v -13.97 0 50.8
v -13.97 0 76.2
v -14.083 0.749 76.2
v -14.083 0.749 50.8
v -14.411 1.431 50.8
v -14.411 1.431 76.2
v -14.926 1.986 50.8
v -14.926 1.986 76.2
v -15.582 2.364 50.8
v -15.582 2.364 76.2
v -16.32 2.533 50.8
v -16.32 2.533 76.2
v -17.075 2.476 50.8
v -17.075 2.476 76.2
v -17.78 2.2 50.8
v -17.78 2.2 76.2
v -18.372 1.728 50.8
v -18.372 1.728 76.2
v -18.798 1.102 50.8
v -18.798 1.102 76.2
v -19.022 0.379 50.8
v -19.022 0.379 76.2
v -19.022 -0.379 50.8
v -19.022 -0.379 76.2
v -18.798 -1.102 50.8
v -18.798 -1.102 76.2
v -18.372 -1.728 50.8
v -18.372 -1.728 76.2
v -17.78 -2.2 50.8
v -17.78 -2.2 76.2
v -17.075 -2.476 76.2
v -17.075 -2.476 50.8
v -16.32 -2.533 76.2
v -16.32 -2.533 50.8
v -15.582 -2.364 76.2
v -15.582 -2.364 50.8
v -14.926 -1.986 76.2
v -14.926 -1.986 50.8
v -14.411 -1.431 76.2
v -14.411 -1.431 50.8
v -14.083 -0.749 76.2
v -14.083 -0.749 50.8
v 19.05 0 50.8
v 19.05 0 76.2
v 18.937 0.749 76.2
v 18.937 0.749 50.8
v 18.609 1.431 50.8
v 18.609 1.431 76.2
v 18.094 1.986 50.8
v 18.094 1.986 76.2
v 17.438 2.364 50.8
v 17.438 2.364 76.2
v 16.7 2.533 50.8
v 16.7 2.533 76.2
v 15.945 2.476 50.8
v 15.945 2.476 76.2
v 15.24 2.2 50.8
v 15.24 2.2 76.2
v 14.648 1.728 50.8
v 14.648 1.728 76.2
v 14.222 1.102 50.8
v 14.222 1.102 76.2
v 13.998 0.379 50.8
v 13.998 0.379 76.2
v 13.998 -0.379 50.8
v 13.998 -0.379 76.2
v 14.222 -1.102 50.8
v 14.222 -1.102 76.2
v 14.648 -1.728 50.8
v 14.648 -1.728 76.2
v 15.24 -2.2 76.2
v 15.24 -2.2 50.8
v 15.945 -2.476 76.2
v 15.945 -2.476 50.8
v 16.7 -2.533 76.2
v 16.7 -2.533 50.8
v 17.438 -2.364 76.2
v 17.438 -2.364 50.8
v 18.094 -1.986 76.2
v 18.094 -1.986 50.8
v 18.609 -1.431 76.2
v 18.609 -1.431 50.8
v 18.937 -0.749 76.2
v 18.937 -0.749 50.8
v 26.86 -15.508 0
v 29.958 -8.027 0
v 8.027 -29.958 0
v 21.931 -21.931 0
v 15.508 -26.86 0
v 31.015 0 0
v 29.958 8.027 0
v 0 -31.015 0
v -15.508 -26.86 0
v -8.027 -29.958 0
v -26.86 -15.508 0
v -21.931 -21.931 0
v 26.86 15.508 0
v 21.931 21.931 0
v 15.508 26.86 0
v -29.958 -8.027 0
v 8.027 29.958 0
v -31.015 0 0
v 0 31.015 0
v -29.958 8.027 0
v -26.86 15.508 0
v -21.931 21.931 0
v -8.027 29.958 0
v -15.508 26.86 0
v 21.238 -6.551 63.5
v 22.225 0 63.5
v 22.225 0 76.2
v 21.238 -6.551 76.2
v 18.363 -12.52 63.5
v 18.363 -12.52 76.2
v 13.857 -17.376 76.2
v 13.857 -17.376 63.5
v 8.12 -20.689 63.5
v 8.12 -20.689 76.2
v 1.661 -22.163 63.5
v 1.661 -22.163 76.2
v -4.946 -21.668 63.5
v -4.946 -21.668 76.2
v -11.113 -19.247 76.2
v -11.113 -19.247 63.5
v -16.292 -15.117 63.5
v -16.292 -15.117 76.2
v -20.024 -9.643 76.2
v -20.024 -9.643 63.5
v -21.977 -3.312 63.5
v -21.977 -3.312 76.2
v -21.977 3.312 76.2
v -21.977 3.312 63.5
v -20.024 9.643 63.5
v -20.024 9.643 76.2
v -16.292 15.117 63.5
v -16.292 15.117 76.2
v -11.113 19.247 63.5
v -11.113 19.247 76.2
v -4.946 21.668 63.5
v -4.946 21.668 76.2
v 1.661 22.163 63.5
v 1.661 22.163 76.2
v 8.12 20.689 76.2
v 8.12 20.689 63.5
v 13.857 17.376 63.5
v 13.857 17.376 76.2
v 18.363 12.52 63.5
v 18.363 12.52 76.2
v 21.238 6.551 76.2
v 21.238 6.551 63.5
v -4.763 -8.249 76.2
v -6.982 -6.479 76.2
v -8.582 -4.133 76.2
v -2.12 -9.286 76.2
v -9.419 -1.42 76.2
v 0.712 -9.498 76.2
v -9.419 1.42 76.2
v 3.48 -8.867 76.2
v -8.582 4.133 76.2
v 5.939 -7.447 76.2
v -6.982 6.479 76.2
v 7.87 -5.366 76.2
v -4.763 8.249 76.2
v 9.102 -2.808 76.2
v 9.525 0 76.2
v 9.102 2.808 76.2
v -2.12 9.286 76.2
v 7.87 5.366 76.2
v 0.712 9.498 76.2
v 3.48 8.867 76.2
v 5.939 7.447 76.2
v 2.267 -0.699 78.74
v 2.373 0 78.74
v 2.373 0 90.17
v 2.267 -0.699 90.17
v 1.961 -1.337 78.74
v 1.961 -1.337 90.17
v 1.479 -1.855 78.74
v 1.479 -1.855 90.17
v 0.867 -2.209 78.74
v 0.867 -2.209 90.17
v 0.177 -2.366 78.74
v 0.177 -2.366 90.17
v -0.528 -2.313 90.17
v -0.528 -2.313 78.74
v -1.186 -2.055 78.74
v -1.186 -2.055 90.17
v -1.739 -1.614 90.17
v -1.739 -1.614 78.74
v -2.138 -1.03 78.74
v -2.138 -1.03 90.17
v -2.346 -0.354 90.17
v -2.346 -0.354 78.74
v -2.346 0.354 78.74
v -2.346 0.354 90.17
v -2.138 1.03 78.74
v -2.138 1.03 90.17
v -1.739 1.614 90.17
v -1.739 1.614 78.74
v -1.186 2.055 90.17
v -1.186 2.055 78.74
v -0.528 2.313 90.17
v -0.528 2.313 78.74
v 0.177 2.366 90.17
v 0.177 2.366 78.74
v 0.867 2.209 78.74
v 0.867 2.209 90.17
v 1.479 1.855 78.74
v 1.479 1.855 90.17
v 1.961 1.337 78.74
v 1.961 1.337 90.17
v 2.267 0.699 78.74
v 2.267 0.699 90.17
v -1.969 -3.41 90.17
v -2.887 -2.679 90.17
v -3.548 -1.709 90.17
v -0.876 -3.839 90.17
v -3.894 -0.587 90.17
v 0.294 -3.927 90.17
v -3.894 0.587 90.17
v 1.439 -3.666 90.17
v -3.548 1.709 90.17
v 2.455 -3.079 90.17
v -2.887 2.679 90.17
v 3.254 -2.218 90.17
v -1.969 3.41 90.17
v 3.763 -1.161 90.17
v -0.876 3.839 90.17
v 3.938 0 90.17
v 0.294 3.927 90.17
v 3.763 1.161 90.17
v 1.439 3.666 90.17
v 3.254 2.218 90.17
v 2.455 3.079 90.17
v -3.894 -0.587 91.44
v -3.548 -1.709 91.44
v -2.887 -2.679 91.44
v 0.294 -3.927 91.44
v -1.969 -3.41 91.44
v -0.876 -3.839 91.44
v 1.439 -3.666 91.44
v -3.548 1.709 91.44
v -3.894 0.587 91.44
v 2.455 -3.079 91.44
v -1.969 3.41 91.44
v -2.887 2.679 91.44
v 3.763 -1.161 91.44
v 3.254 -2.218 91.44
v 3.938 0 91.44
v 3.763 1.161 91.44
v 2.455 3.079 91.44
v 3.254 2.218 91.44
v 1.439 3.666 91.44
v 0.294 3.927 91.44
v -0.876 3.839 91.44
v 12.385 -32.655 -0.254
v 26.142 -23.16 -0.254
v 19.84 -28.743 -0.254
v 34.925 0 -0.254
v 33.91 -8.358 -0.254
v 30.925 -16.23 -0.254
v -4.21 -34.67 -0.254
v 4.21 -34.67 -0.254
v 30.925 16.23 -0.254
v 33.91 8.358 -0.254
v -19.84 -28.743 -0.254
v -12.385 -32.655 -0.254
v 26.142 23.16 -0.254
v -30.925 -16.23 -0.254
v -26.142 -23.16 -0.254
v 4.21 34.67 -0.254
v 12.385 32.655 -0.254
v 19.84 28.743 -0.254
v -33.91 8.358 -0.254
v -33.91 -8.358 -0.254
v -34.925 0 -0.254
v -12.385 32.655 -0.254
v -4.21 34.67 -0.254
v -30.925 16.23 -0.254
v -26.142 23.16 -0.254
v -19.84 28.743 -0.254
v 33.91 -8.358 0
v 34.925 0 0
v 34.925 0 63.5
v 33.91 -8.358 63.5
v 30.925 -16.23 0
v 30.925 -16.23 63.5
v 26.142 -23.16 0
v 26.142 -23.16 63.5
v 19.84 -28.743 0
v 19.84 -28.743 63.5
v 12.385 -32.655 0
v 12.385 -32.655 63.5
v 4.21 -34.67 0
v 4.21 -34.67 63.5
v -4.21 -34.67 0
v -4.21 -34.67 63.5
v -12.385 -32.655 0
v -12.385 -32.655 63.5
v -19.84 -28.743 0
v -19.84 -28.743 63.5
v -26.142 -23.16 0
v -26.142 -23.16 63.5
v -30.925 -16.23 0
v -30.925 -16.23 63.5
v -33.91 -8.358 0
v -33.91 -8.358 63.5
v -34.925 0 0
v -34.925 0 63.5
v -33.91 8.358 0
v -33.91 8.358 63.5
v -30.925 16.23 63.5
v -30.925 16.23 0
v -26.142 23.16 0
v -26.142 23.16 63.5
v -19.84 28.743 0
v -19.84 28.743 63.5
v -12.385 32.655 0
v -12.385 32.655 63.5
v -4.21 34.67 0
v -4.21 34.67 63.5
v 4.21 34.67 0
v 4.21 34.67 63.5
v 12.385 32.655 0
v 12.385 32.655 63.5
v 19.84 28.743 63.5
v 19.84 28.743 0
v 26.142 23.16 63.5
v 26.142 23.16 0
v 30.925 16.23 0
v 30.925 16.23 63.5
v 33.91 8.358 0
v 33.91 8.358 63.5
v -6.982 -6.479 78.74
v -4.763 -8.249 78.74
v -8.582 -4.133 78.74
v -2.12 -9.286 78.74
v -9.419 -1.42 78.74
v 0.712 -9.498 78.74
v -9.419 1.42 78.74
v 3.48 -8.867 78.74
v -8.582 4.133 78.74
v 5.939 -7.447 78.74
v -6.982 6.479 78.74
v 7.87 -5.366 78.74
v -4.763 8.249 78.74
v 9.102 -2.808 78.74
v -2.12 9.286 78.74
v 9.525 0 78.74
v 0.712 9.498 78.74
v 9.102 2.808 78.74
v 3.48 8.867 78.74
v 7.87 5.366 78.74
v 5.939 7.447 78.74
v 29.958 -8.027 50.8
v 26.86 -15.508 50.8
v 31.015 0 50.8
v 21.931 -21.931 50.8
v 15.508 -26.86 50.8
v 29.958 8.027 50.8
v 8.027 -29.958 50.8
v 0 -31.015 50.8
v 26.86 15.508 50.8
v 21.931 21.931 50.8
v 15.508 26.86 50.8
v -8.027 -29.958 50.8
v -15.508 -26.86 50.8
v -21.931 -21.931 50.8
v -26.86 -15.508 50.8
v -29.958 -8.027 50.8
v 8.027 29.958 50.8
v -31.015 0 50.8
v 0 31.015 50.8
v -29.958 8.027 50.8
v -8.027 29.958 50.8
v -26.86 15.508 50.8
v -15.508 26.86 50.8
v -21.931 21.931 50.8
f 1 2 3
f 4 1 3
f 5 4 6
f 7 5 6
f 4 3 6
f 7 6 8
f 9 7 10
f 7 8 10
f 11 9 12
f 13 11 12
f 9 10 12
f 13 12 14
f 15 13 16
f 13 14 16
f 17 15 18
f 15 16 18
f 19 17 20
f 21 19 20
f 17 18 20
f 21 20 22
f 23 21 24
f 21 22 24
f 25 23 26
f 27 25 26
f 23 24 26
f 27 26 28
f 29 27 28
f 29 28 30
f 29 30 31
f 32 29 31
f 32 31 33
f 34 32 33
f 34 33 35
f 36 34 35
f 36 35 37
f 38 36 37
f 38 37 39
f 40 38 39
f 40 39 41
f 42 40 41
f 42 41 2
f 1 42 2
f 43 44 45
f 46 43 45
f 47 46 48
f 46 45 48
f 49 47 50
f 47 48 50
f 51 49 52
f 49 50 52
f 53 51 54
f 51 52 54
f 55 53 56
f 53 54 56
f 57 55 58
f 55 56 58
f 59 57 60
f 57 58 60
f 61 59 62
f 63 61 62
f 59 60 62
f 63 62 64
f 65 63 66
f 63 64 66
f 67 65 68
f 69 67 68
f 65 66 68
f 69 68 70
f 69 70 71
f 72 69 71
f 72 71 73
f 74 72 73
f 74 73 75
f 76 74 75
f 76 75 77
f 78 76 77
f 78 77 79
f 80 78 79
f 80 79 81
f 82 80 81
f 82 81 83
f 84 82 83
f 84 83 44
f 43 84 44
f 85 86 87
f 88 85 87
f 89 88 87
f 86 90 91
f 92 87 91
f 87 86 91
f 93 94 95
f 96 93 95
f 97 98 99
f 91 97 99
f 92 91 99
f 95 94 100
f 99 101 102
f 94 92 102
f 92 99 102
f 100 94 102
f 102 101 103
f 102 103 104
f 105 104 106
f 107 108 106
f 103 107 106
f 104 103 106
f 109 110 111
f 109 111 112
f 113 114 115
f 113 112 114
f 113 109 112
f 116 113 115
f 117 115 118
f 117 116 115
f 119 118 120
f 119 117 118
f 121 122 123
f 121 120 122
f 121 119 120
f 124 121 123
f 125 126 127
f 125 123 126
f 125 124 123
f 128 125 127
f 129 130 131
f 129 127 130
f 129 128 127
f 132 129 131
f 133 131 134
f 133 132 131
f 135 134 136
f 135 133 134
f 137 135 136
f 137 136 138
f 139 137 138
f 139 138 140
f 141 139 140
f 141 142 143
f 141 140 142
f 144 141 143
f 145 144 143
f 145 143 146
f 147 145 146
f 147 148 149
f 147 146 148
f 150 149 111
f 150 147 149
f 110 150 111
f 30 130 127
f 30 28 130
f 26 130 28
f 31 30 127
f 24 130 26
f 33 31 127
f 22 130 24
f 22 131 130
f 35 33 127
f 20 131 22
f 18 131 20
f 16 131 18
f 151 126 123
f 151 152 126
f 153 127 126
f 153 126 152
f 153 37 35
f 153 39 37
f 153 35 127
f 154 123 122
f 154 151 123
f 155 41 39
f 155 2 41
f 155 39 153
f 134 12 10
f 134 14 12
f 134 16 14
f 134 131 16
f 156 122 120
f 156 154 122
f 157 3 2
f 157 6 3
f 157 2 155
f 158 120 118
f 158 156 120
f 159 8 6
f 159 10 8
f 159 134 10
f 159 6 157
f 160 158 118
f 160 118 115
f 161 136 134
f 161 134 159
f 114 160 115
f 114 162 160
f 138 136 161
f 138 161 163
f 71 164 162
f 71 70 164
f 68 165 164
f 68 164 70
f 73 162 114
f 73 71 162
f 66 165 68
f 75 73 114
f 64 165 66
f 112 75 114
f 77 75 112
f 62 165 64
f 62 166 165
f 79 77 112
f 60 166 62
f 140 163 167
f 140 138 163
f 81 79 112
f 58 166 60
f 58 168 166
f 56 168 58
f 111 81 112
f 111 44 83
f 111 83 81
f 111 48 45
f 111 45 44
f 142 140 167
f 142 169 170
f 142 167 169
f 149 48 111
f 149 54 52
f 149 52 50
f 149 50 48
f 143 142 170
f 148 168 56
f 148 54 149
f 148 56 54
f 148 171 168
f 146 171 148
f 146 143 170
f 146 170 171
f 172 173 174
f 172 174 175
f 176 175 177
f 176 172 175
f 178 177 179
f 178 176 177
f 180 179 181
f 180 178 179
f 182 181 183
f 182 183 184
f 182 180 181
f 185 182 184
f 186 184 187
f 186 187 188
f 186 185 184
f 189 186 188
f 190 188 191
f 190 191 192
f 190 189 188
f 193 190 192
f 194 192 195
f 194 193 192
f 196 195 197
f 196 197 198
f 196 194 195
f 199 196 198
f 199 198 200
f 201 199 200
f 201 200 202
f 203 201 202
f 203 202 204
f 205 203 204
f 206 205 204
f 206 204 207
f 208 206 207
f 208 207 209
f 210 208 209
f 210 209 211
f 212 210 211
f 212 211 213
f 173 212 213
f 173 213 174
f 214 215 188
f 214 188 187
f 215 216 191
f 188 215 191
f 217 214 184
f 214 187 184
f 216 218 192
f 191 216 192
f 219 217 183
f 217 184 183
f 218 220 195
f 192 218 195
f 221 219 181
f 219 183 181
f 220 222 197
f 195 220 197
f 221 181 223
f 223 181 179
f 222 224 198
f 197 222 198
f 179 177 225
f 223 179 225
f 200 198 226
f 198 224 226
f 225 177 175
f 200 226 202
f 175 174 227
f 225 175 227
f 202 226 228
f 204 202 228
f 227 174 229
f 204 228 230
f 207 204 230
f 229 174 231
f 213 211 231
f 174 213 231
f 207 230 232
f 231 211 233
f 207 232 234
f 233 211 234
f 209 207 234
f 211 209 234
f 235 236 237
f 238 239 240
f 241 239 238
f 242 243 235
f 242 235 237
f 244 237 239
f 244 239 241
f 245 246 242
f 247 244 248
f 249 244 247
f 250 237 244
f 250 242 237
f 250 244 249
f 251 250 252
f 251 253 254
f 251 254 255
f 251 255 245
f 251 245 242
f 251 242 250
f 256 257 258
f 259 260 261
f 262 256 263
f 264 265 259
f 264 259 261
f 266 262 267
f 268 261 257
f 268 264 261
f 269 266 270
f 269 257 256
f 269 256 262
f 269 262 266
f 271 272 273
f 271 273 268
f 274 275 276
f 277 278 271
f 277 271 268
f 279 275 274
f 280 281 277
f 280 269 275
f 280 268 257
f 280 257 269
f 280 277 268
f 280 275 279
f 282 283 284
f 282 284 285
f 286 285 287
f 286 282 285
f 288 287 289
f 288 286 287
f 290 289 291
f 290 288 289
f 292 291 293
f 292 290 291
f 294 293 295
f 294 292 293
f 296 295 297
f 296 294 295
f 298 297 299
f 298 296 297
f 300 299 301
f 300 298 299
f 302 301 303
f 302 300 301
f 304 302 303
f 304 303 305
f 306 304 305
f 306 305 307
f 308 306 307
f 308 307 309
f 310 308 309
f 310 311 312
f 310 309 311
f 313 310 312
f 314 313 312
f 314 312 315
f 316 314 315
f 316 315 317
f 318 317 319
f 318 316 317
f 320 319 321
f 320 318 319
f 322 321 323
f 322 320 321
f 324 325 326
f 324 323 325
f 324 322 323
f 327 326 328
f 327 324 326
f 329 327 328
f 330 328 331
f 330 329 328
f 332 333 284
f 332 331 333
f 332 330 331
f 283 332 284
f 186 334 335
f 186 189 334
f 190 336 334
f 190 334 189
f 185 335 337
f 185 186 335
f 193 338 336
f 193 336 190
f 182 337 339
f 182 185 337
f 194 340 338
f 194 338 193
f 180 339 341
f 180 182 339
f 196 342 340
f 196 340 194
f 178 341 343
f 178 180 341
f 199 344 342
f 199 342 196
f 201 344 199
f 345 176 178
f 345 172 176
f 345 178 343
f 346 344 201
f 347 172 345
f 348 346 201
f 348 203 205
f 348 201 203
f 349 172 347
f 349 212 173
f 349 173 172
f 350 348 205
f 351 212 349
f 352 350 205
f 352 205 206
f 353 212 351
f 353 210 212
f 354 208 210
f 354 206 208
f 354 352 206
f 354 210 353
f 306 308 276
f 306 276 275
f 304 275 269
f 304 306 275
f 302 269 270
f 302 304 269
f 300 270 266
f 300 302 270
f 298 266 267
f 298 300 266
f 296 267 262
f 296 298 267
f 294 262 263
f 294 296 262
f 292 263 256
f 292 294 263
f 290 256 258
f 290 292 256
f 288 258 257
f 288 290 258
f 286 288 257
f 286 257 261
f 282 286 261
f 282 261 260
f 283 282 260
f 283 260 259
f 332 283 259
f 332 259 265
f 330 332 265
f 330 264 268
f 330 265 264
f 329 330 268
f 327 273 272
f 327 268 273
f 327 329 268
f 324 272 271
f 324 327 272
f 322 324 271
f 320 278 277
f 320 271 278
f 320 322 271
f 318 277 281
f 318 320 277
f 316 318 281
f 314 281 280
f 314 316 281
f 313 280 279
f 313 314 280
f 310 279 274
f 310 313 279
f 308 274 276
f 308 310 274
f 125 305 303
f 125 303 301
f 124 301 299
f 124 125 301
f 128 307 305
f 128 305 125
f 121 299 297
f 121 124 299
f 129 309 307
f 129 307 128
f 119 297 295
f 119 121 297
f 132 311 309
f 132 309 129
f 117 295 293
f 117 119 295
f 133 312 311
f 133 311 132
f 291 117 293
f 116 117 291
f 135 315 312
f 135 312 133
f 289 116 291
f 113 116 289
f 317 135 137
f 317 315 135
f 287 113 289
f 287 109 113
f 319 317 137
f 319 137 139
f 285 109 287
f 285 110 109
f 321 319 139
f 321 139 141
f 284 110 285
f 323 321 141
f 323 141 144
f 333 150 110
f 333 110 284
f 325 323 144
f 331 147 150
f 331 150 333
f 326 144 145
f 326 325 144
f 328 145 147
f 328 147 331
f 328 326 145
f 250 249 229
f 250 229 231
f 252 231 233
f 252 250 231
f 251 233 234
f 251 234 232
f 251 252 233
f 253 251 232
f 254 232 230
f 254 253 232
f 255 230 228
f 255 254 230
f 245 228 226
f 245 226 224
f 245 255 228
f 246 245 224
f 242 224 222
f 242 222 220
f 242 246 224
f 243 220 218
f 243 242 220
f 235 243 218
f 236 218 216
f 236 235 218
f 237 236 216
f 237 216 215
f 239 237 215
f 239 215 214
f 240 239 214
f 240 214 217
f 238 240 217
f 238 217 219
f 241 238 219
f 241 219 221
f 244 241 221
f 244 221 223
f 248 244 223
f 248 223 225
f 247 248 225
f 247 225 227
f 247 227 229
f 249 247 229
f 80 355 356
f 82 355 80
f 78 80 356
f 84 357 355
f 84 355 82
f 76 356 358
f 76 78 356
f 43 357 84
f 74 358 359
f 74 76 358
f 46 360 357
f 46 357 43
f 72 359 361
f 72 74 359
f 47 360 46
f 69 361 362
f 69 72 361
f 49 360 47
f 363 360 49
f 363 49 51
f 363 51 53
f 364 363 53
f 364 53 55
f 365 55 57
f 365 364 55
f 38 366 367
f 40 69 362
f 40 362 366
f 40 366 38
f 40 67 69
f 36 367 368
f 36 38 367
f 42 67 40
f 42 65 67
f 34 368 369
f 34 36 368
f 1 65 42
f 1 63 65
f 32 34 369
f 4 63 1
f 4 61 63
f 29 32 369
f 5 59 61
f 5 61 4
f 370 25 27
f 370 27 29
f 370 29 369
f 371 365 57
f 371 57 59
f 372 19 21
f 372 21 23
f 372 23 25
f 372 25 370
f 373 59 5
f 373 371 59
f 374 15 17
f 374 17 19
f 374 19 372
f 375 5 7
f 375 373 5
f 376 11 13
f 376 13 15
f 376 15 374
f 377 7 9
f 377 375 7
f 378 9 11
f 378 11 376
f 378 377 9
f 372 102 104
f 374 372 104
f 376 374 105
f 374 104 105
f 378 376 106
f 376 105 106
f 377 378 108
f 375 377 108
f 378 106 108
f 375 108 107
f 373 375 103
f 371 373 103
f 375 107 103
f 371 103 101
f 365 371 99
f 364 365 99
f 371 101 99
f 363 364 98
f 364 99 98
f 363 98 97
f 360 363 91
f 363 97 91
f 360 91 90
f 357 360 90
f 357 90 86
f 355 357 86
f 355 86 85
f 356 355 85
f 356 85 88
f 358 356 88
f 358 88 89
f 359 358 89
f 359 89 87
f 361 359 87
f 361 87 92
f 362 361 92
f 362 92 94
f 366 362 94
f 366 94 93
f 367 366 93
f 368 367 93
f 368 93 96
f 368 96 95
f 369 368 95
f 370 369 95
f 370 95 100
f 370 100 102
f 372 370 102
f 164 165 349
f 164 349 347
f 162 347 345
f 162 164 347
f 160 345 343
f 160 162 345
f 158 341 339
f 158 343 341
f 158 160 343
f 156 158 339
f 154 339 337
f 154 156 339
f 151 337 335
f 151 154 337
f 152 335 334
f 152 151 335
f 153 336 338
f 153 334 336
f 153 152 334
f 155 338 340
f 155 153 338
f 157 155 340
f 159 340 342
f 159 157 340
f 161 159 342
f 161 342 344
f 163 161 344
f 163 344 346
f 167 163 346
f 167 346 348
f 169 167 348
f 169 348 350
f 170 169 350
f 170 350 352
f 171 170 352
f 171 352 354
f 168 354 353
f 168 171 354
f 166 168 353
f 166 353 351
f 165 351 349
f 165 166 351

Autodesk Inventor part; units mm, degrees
ref_plane "YZ Plane" through (0, 0, 0) normal (1, 0, 0) x (0, 1, 0)
ref_plane "XZ Plane" through (0, 0, 0) normal (0, 1, 0) x (-1, 0, 0)
sketch "Sketch1" plane through (0, 0, 0) normal (0, 0, 1) x (1, 0, 0)
  circle A0 centre (0, 0) radius 34.925
  dimension "d0" = 69.85
extrude "Extrusion1" add sketch "Sketch1" along normal blind 63.5
sketch "Sketch2" plane through (0, 0, 63.5) normal (0, 0, 1) x (1, 0, 0)
  circle A0 centre (0, 0) radius 22.225
  dimension "d3" = 44.45
extrude "Extrusion2" add sketch "Sketch2" along normal blind 12.7
sketch "Sketch3" plane through (0, 0, 76.2) normal (0, 0, 1) x (1, 0, 0)
  circle A0 centre (0, 0) radius 9.525
  dimension "d6" = 19.05
extrude "Extrusion3" add sketch "Sketch3" along normal blind 2.54
sketch "Sketch4" plane through (0, 0, 78.74) normal (0, 0, 1) x (1, 0, 0)
  circle A0 centre (0, 0) radius 2.3729
extrude "Extrusion4" add sketch "Sketch4" along normal blind 12.7
ref_plane "Work Plane1" through (0, 0, 91.44) normal (0, 0, 1) x (1, 0, 0)
sketch "Sketch5" plane through (0, 0, 91.44) normal (0, 0, 1) x (1, 0, 0)
  circle A0 centre (0, 0) radius 3.9381
extrude "Extrusion5" add sketch "Sketch5" against normal blind 1.27
sketch "Sketch6" plane through (0, 0, 78.74) normal (0, 0, 1) x (1, 0, 0)
  line L0 (0, 0) -> (-16.51, 0)
  circle A0 centre (-16.51, 0) radius 2.54
  dimension "d14" = 16.51
  dimension "d15" = 5.08
extrude "Extrusion6" cut sketch "Sketch6" against normal blind 38.1
sketch "Sketch7" plane through (0, 0, 76.2) normal (0, 0, 1) x (1, 0, 0)
  line L0 (0, 0) -> (16.51, 0)
  circle A0 centre (16.51, 0) radius 2.54
  dimension "d18" = 16.51
  dimension "d19" = 5.08
extrude "Extrusion7" cut sketch "Sketch7" against normal blind 38.1
sketch "Sketch8" plane through (0, 0, 0) normal (0, 0, -1) x (-1, 0, 0)
  circle A0 centre (0, 0) radius 31.0151
extrude "Extrusion8" cut sketch "Sketch8" against normal blind 50.8
sketch "Sketch9" plane through (0, 0, 0) normal (0, 0, -1) x (-1, 0, 0)
  circle A0 centre (0, 0) radius 34.925
extrude "Extrusion9" add sketch "Sketch9" along normal blind 0.254
properties part number "000109"
